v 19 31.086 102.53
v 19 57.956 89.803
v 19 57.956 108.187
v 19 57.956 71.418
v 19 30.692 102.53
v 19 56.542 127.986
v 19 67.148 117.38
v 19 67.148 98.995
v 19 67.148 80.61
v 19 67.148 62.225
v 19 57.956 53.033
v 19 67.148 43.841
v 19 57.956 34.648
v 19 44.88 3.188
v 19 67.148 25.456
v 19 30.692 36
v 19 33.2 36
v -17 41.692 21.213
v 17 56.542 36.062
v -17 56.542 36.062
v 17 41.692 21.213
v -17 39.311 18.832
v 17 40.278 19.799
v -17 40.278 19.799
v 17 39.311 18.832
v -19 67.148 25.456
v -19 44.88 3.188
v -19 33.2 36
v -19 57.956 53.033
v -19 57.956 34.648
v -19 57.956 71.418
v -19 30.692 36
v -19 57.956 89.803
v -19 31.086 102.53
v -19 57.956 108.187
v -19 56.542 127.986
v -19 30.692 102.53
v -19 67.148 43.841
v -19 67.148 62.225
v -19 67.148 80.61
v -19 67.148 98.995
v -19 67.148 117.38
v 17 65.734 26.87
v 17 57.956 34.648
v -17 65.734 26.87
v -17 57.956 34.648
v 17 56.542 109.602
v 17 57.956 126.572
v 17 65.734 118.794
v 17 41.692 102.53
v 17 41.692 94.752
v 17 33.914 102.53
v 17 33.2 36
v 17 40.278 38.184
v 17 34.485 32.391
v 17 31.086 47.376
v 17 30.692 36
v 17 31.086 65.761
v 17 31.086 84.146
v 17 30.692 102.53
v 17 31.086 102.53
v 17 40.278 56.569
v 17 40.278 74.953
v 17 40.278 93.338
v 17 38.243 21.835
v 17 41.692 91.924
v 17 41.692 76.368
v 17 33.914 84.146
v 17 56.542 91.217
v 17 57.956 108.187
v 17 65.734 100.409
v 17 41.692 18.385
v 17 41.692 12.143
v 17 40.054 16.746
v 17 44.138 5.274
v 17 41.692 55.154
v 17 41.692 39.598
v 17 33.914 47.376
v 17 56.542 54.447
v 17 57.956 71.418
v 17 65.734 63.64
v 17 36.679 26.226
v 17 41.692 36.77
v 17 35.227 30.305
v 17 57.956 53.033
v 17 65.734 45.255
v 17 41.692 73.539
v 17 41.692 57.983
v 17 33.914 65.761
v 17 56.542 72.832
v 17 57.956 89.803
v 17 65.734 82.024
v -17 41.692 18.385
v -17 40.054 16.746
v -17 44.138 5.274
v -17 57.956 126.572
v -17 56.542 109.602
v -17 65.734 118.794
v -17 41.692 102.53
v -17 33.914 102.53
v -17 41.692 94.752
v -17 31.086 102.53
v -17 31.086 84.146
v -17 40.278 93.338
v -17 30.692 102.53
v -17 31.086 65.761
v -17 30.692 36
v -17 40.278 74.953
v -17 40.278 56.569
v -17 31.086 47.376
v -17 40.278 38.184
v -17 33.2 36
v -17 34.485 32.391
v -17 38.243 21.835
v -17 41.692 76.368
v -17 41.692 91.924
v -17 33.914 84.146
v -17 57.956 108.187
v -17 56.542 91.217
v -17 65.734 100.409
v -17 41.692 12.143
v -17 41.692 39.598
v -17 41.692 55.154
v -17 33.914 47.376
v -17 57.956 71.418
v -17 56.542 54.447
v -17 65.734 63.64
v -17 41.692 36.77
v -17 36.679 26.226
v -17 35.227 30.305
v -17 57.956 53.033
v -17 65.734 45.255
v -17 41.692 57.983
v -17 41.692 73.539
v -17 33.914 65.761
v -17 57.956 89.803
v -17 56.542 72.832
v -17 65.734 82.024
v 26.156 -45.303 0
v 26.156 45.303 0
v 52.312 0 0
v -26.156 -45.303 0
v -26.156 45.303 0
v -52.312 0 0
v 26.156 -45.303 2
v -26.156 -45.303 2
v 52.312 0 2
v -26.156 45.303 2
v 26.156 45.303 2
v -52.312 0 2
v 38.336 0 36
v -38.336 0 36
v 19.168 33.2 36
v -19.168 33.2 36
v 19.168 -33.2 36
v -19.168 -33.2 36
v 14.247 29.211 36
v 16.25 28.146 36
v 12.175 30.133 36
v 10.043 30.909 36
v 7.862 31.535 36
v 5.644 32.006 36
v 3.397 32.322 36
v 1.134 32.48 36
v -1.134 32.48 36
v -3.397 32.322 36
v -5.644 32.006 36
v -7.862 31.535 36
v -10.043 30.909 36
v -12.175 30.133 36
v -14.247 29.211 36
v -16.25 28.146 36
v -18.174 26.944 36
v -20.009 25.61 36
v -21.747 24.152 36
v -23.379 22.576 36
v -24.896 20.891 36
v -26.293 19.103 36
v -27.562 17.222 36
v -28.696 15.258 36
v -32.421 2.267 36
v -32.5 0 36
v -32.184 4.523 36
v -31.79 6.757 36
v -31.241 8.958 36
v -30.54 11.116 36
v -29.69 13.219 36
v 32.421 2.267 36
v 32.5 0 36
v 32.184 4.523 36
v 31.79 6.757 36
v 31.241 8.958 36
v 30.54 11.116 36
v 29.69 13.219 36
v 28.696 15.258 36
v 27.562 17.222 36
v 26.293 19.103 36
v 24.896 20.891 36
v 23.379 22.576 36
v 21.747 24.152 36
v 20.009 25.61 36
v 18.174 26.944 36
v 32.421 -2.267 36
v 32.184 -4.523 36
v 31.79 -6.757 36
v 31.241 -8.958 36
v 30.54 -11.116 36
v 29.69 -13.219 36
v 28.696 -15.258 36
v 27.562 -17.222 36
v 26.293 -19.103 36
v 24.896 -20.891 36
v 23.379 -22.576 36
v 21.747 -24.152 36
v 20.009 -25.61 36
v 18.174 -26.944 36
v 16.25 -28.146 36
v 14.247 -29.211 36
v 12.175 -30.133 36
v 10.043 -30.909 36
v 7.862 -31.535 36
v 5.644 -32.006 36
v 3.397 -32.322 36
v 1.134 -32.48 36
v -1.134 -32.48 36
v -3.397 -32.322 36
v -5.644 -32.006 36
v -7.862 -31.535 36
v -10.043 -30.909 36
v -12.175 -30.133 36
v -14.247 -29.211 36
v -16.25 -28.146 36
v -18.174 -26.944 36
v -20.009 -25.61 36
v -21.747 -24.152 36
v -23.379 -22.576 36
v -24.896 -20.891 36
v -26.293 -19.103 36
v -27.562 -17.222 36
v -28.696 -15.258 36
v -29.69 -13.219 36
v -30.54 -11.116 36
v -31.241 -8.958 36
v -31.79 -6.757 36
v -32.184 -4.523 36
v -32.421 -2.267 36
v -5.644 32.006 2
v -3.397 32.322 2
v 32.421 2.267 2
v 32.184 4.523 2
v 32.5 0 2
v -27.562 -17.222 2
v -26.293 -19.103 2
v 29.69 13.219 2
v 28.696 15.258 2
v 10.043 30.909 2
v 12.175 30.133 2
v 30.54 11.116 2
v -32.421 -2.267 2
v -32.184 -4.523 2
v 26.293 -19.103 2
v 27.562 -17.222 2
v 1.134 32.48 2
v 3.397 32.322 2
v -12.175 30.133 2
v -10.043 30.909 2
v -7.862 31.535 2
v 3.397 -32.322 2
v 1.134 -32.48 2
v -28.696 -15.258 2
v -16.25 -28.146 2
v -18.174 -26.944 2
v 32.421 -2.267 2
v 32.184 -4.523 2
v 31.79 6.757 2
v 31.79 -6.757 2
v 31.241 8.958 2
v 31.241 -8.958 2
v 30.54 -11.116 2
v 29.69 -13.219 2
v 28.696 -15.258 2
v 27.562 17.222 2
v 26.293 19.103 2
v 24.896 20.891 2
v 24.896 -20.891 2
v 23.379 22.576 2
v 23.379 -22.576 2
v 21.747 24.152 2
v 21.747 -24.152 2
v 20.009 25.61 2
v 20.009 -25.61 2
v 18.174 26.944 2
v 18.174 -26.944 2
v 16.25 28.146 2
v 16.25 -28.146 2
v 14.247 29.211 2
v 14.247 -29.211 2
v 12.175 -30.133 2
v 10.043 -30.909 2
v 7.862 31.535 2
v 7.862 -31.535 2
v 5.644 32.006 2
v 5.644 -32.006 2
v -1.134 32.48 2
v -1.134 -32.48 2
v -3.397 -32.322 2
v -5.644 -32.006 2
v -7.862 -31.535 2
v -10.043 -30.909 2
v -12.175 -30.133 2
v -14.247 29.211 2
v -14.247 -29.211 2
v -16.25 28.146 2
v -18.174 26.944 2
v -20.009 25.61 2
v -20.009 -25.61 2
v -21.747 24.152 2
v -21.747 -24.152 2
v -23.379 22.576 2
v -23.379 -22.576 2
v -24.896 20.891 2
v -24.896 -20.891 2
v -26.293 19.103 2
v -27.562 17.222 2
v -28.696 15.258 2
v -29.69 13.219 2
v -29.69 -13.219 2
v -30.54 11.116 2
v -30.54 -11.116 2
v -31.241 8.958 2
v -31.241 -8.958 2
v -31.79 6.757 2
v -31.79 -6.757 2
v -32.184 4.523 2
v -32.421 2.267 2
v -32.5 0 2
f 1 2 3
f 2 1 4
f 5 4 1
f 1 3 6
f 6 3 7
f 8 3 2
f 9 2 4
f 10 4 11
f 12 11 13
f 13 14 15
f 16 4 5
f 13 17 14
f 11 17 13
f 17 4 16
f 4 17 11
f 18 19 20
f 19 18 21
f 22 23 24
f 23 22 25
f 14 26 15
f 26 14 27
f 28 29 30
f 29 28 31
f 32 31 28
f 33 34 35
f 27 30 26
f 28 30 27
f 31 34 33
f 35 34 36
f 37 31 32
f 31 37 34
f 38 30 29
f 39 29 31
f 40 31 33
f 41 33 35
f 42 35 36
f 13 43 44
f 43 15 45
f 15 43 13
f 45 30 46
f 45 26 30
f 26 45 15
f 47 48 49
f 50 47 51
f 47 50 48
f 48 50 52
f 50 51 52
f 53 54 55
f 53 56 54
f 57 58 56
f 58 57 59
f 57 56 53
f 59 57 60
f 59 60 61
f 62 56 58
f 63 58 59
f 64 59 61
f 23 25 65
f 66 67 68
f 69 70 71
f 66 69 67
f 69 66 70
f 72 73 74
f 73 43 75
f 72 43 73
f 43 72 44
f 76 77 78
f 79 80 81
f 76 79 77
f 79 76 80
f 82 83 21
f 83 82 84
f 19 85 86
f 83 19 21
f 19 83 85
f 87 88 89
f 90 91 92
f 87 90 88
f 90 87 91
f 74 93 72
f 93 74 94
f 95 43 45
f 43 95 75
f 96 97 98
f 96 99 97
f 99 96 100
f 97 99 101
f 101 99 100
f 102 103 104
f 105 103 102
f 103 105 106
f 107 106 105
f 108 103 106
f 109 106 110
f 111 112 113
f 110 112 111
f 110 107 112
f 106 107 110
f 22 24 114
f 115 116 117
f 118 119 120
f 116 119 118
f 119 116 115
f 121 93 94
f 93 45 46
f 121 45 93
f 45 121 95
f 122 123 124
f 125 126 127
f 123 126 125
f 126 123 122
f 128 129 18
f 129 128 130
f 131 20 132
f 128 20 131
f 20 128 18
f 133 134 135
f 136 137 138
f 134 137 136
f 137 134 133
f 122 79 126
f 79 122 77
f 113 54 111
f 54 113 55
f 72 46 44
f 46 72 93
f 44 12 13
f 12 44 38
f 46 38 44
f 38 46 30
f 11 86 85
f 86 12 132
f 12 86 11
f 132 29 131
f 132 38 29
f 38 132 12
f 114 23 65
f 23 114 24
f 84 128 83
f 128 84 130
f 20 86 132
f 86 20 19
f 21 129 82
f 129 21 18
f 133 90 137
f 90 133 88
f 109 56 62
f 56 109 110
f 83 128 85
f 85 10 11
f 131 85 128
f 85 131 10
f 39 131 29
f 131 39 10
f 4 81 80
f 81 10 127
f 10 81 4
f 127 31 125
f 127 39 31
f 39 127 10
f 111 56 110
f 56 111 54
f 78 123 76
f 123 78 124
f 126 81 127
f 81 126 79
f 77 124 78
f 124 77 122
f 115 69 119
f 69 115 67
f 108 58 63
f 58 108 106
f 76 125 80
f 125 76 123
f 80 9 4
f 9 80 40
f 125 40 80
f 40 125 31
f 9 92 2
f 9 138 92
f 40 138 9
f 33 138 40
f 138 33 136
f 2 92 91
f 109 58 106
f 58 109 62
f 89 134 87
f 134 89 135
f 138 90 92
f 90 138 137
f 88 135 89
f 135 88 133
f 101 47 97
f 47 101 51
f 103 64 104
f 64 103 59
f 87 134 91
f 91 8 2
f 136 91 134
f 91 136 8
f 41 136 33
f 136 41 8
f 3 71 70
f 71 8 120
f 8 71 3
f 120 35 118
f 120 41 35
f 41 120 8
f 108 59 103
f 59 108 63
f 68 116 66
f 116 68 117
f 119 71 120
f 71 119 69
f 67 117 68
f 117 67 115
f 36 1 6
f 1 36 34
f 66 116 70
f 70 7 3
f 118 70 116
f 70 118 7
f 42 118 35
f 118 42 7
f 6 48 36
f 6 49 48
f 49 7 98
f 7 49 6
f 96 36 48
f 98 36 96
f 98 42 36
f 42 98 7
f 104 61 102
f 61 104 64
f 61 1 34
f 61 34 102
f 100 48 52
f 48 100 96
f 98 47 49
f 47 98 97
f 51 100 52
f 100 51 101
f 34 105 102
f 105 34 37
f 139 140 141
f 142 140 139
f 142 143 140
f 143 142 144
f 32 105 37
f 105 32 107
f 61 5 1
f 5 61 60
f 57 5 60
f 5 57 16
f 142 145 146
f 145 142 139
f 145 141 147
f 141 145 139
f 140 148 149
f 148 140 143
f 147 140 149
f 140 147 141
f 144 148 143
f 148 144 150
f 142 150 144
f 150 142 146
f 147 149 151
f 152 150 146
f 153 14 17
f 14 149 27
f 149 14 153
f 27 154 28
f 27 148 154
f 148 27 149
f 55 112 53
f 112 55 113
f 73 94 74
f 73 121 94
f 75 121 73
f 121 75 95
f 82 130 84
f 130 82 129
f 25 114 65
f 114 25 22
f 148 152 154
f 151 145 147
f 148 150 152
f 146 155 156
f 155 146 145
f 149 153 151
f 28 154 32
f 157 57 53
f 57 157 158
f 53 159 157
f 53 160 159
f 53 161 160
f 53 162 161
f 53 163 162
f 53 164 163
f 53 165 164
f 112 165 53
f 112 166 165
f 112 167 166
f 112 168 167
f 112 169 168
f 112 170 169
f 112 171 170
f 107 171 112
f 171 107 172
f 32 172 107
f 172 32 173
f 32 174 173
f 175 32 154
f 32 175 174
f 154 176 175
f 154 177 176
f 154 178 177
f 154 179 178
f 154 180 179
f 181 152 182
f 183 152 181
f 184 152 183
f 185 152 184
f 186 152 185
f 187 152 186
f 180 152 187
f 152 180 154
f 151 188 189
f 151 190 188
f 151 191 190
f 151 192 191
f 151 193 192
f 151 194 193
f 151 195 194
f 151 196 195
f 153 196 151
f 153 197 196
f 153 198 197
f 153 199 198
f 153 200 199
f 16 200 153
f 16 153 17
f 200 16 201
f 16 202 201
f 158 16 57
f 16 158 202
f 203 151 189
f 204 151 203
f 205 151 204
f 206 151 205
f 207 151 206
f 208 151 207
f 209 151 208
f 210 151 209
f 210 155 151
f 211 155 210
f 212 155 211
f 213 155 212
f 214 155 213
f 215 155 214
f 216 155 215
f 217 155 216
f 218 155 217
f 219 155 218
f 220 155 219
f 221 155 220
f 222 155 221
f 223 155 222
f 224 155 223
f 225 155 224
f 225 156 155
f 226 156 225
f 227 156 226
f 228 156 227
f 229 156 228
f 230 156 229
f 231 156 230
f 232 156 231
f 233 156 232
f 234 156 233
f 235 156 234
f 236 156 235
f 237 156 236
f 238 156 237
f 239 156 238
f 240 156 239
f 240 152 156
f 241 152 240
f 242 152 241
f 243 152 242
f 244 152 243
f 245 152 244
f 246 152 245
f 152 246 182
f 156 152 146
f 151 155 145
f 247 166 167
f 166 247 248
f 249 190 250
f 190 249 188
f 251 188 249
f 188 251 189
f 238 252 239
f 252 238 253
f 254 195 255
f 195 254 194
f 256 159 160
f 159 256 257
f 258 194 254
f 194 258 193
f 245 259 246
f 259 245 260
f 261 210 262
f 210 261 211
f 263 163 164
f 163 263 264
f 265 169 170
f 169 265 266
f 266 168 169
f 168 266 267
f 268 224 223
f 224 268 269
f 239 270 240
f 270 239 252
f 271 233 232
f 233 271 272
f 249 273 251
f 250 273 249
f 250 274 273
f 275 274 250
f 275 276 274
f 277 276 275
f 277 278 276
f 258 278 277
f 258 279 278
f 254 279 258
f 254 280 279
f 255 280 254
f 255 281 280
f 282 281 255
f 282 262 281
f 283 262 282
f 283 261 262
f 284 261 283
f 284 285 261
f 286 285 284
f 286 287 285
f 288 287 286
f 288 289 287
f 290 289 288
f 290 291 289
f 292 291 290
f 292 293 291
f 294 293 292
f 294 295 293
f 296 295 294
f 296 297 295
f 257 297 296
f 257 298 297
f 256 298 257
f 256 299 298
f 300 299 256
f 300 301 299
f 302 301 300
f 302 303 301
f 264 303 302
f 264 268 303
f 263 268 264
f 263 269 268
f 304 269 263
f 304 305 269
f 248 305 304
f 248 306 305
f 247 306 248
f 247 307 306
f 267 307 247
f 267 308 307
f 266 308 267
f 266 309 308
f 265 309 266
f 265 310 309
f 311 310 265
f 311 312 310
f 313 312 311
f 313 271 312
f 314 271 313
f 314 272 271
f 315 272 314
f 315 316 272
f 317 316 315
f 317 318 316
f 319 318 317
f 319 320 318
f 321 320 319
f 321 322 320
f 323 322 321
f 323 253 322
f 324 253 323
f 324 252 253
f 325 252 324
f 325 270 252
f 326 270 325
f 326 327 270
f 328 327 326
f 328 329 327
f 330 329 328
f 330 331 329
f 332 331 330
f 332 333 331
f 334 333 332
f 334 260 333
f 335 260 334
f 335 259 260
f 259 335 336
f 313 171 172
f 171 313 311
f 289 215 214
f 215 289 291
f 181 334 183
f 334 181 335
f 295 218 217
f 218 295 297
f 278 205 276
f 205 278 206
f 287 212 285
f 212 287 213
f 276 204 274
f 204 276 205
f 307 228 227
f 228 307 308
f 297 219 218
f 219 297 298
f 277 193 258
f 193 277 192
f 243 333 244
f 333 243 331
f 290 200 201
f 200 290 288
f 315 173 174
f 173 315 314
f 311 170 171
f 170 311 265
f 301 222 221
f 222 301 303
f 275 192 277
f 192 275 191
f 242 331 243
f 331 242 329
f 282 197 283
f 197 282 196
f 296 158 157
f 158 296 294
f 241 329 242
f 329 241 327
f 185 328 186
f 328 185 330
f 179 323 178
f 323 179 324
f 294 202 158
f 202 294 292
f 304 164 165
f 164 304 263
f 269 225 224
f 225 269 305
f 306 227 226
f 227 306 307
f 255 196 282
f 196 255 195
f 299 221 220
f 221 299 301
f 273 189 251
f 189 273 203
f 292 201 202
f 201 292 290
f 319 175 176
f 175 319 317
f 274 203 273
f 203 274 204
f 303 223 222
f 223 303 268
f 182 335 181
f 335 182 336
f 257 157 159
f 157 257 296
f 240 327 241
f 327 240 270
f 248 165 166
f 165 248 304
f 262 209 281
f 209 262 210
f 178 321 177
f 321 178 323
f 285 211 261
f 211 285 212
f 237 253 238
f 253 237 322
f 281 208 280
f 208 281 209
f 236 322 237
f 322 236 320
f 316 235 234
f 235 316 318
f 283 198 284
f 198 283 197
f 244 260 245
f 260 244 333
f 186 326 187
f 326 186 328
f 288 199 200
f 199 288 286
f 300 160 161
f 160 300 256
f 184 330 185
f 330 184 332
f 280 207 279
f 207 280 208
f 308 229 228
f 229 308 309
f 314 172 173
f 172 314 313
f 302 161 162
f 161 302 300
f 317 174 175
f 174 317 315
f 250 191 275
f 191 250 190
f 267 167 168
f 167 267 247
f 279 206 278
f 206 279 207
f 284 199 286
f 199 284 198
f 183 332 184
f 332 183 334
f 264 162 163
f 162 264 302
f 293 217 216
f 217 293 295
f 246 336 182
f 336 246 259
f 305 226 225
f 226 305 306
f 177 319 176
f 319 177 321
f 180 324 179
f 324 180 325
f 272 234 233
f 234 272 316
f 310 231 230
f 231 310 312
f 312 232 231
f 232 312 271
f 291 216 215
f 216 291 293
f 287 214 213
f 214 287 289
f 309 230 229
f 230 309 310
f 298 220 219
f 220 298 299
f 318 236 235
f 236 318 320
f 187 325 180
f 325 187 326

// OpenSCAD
eps = 0.01;
$fn = 90;
tol = 0.2;

// basic pareters
wt = 2;

// contact len shelf dimensions
cls_x = 34;
cls_y = 34;
cls_z = 11;

// contact len solution bottle dimensions
sb_d = 65;
sb_h = cls_x;


// contact len shelf
module cl_shelf()
{
    _a = cls_x+2*wt;
    _b = cls_y+wt;
    _c = cls_z+2*wt;
    translate([-_a/2,0,0])
        difference()
        {
            cube([_a,_b,_c]);
            translate([wt,wt,wt])
                cube([cls_x,cls_y+eps,cls_z]);
        }
}


module cl_holder()
{
    
    n_cl = 5;
    // shelfs
    difference()
    {
        union()
        {
            translate([0,sb_d/2+((cls_z+wt)*2/sqrt(2))/2,0])
            {
                for(i=[0:n_cl])
                {
                    z_off = i*(cls_z+wt)*2/sqrt(2);
                    translate([0,0,z_off])
                        rotate([45,0,0])
                            cl_shelf();
                }
                
                // side supports
                translate([-cls_x/2-wt,-cls_z,0])
                    cube([wt,cls_z,
                          ((n_cl+0.5)*(cls_z+wt)+0.5*wt)*2/sqrt(2)]);
                translate([cls_x/2,-cls_z,0])
                    cube([wt,cls_z,
                          ((n_cl+0.5)*(cls_z+wt)+0.5*wt)*2/sqrt(2)]);
            }
            // lower part
            _R = sqrt(45*45+(45/2)*(45/2))+wt;
            _r = sqrt((sb_d/2)*(sb_d/2) + (sb_d/4)*(sb_d/4))+wt;
            cylinder(r=_R,h=wt,$fn=6);
            translate([0,0,wt])
                cylinder(r1=_R,r2=_r,h=sb_h,$fn=6);
        }
        translate([0,0,wt])
            cylinder(d=sb_d,h=sb_h+eps);
    }
    %cylinder(d=90);
    

        
}


module cl_stand()
{
    
    n_cl = 5;
    // shelfs
    difference()
    {
        _a = cls_x+2*wt;
        _b = cls_y+wt;
        _c = cls_z+2*wt;
        //translate([-_a/2,0,0])
        //    difference()
        //    {
        //        cube([_a,_b,_c]);

        //    }
        union()
        {
        
            for(i=[0:n_cl])
            {
                z_off = 0;
                y_off = sb_d/2+cls_z+2*wt;
                rotate([0,0,i*60])
                    translate([-_a/2,y_off,z_off])
                        rotate([90,0,0])
                            //cl_shelf();
                            cube([_a,_b,_c]);
            }
            
            // lower part
            _R = sqrt(45*45+(45/2)*(45/2))+wt;
            _r = sqrt((sb_d/2)*(sb_d/2) + (sb_d/4)*(sb_d/4))+wt;
            cylinder(r=_R,h=wt,$fn=6);
                translate([0,0,wt])
            cylinder(r1=_R,r2=_r,h=sb_h,$fn=6);    
        }
        
        for(i=[0:n_cl])
        {   
            z_off = 0;
            y_off = sb_d/2+cls_z+2*wt;
            rotate([0,0,i*60])
                    translate([-_a/2,y_off,z_off])
                        rotate([90,0,0])
                            translate([wt,wt,wt])
                                cube([cls_x,cls_y+eps,cls_z]);
        }
            
        translate([0,0,wt])
            cylinder(d=sb_d,h=100);
    }
    //%cylinder(d=90);
}

cl_holder();
    
